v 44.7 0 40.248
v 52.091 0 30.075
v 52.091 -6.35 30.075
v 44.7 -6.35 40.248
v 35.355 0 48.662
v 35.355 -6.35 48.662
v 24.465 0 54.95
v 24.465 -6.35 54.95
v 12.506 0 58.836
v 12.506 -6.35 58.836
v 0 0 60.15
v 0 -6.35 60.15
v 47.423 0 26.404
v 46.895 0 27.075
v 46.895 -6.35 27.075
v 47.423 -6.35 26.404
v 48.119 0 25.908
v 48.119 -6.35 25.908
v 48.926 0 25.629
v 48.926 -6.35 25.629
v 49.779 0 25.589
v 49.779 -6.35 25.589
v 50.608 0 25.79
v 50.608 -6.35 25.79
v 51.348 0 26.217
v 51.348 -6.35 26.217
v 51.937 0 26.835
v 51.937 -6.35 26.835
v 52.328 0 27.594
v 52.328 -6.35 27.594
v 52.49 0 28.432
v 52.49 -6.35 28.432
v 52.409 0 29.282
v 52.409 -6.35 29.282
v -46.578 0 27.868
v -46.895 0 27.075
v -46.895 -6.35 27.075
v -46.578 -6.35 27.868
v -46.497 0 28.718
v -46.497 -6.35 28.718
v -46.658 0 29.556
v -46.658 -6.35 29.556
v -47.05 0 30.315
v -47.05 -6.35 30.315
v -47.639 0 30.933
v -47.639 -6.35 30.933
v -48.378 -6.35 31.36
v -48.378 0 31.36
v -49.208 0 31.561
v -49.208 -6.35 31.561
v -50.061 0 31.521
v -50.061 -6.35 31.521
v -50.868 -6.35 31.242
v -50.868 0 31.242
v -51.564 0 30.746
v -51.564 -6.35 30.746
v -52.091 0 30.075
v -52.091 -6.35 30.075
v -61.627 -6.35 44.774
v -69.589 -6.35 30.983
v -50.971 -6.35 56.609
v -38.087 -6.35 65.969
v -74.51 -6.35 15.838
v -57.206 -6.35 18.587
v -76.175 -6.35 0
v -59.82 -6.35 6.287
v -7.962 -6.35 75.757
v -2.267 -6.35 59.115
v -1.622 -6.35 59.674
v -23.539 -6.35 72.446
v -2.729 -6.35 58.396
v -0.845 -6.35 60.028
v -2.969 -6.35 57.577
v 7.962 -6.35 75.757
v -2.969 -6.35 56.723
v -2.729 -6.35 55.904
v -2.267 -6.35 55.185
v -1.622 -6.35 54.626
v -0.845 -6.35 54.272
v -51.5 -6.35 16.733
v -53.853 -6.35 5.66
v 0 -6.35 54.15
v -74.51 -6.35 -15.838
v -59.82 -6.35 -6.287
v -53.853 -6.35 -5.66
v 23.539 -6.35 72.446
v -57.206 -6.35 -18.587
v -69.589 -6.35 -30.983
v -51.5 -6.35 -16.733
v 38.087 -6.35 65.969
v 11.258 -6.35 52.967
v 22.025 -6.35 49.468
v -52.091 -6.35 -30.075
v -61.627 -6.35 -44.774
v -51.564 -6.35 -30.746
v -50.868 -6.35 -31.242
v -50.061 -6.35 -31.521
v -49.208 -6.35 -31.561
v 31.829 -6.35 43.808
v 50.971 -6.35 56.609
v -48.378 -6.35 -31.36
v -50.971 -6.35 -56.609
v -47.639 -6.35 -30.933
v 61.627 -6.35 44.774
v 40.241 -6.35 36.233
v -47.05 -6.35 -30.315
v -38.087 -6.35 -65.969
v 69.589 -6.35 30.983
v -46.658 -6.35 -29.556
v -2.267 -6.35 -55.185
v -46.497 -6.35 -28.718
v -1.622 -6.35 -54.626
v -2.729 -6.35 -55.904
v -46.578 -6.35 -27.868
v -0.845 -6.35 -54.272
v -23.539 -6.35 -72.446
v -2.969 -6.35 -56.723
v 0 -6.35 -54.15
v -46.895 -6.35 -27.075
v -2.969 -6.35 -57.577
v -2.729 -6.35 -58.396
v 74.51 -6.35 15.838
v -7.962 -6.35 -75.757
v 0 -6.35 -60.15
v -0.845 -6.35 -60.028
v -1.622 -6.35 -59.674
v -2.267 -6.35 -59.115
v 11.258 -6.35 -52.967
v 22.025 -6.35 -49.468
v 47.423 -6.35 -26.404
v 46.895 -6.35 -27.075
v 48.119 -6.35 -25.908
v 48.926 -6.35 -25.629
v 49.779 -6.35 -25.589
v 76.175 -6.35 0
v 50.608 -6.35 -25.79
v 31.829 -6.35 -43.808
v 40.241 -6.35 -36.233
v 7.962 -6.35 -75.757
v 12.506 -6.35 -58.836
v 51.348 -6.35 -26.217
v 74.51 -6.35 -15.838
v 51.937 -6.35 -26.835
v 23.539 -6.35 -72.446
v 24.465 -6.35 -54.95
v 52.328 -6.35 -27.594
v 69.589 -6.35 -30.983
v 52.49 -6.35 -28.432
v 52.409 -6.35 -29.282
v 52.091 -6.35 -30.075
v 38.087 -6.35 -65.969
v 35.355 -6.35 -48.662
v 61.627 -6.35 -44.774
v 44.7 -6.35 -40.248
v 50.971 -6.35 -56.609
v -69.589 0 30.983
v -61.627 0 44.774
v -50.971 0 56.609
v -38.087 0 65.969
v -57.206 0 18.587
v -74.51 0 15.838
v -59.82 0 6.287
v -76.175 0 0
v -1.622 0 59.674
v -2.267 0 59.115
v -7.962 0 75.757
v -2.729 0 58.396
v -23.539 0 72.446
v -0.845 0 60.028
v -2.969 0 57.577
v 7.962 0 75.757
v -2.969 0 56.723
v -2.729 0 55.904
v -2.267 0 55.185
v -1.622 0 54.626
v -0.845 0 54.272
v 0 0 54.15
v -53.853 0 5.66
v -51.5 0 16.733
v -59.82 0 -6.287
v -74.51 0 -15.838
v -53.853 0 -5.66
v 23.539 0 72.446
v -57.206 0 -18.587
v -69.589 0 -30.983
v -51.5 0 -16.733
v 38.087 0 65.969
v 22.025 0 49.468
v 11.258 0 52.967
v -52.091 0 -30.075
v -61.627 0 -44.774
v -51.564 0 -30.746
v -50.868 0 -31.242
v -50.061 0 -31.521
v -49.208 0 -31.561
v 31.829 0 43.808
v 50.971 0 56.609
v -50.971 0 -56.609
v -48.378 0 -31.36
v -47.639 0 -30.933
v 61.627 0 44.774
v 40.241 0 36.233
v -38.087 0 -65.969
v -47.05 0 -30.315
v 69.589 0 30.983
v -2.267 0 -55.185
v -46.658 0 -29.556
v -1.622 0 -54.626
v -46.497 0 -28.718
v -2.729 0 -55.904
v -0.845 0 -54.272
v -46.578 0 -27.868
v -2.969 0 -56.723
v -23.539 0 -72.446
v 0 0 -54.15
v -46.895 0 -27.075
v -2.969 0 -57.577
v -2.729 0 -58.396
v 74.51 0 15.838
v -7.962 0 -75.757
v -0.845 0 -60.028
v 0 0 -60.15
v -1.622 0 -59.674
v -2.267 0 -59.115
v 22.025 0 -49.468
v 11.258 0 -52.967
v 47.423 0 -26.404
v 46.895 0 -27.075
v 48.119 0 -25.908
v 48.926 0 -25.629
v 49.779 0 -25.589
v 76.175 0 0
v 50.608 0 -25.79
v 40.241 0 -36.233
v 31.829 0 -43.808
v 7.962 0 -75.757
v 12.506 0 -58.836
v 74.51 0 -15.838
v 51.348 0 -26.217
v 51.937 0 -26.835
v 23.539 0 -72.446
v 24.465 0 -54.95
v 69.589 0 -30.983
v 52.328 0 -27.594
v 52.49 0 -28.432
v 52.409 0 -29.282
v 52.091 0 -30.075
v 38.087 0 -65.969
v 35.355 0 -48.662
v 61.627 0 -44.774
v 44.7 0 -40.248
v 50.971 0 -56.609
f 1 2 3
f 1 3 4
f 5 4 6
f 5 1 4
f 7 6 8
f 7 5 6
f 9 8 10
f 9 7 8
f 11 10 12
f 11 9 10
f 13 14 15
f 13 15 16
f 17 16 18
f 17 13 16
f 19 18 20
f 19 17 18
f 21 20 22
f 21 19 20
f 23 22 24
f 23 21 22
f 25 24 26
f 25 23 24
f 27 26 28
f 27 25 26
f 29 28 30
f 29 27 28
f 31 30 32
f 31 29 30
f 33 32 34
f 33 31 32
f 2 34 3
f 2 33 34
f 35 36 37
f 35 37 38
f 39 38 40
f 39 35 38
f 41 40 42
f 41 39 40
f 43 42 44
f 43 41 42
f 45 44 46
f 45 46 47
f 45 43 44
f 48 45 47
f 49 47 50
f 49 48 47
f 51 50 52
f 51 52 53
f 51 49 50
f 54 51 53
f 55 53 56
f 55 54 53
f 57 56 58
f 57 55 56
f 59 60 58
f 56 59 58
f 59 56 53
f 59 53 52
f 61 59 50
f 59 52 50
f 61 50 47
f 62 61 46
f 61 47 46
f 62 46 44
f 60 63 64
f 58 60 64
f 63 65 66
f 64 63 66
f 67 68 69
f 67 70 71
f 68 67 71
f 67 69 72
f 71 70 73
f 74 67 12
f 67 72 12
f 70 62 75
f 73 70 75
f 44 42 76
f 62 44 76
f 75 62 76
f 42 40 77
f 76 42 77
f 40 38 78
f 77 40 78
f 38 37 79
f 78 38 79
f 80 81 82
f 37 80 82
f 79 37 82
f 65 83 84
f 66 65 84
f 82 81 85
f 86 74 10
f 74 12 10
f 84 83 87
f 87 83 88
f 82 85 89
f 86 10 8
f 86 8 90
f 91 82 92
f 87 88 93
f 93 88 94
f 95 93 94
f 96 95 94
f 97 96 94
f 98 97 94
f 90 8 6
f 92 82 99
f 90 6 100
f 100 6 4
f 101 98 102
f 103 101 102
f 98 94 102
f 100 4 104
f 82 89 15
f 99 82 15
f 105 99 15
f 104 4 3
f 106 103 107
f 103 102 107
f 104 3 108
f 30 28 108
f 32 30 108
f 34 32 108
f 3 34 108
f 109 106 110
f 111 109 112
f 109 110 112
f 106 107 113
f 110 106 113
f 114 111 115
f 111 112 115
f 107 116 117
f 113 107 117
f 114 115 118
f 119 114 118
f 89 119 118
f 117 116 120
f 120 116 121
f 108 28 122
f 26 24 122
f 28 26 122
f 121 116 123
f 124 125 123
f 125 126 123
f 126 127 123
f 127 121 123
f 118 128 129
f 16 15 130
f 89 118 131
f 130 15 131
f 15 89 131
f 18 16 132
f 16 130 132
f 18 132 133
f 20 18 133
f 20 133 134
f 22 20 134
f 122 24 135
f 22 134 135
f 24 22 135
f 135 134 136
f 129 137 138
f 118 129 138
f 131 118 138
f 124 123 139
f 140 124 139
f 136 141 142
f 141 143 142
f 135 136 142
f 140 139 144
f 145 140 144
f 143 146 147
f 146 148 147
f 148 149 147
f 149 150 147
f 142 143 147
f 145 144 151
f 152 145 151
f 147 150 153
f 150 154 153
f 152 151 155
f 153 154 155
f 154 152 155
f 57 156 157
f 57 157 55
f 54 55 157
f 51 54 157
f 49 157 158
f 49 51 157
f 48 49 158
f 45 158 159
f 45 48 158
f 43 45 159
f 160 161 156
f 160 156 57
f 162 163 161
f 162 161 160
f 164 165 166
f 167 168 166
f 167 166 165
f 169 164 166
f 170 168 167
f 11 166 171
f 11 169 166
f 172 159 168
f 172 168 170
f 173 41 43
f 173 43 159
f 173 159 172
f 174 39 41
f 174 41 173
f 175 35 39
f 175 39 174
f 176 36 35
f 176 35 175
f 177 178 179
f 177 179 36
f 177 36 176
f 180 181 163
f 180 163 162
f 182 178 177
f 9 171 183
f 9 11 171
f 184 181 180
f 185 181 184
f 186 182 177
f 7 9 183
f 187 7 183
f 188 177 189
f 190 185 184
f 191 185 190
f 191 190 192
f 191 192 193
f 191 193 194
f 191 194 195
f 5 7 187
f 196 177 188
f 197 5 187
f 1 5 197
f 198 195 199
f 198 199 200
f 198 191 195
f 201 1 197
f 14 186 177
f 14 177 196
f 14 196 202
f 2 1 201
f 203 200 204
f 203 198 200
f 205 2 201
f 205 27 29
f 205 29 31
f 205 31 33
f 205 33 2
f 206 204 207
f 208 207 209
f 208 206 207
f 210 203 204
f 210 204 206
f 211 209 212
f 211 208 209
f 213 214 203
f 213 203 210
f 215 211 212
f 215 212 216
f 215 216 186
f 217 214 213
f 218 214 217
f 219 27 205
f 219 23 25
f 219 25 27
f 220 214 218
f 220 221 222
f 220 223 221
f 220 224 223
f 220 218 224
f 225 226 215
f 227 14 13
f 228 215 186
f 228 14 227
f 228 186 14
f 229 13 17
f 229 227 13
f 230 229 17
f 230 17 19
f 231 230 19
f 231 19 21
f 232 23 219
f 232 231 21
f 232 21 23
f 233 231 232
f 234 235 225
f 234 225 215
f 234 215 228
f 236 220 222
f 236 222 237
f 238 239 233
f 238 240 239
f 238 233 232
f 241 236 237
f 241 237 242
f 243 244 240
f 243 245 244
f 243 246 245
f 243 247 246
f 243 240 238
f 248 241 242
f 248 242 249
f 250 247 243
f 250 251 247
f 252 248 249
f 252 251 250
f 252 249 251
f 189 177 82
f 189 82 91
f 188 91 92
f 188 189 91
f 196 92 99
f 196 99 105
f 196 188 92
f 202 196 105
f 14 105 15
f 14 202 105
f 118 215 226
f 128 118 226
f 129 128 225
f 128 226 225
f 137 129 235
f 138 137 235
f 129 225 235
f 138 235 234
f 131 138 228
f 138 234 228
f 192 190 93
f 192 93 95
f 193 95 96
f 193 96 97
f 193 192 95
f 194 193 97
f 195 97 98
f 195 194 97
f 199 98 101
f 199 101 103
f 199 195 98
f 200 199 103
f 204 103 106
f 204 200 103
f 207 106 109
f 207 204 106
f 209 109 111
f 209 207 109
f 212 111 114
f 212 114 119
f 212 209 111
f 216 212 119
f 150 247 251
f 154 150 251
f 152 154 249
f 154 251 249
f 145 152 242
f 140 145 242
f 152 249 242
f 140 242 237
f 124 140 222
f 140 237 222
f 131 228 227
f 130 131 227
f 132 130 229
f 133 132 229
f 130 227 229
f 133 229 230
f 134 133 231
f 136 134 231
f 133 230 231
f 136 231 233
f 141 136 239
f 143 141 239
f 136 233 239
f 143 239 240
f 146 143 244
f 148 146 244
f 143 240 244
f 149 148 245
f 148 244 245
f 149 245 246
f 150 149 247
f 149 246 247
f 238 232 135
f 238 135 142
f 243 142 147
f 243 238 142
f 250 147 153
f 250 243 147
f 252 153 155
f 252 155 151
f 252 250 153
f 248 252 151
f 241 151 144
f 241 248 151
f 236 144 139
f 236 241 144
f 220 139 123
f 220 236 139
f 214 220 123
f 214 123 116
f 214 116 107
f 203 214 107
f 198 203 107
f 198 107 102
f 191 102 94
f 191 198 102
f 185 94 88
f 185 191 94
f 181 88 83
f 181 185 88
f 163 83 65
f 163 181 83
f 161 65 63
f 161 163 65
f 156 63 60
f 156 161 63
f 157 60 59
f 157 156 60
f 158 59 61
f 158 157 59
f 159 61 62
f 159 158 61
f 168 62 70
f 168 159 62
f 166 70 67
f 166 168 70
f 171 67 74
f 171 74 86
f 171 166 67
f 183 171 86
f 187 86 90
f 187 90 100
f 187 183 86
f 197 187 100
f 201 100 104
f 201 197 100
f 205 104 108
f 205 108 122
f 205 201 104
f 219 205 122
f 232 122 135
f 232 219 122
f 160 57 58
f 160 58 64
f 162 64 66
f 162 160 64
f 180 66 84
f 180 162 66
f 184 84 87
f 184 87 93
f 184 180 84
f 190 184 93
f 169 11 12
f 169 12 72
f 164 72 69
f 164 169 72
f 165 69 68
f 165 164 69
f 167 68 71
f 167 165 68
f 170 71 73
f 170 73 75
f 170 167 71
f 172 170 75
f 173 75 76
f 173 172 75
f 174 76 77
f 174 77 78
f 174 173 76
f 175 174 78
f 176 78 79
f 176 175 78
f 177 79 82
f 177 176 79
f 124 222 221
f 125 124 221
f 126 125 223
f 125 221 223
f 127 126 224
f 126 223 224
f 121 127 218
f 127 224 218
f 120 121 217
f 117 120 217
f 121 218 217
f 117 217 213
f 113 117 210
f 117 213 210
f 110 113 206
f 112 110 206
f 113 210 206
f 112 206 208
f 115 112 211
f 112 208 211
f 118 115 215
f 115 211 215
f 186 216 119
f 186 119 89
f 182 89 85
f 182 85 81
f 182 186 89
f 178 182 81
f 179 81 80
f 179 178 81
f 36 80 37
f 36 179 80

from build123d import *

# Parameters (mm, degrees)
SKETCH2_R           = 76.1746
BOSS_EXTRUDE1_DEPTH = 6.35


with BuildPart() as part:
    # Sketch2 → Boss-Extrude1 (new body)
    with BuildSketch(Plane(origin=(0, 0, 0), x_dir=(1, 0, 0), z_dir=(0, 1, 0))):
        Circle(SKETCH2_R)
        with BuildLine():
            ThreePointArc((52.091428011, 30.074999984), (30.074999985, 52.091428011), (0, 60.149999969))
            ThreePointArc((0, 60.149999969), (-2.999999969, 57.15), (0, 54.150000031))
            ThreePointArc((0, 54.150000031), (27.075000016, 46.895275642), (46.895275642, 27.075000015))
            ThreePointArc((46.895275642, 27.075000015), (50.993351811, 25.976923815), (52.091428011, 30.074999984))
        make_face(mode=Mode.SUBTRACT)
        with BuildLine():
            ThreePointArc((0, -54.150000031), (27.075000016, -46.895275642), (46.895275642, -27.075000015))
            ThreePointArc((46.895275642, -27.075000015), (50.993351811, -25.976923815), (52.091428011, -30.074999985))
            ThreePointArc((52.091428011, -30.074999985), (30.074999984, -52.091428011), (0, -60.149999969))
            ThreePointArc((0, -60.149999969), (-2.999999969, -57.15), (0, -54.150000031))
        make_face(mode=Mode.SUBTRACT)
        with BuildLine():
            ThreePointArc((-46.895275642, 27.075000015), (-54.150000031, 0), (-46.895275642, -27.075000016))
            ThreePointArc((-46.895275642, -27.075000016), (-47.993351842, -31.173076185), (-52.091428011, -30.074999985))
            ThreePointArc((-52.091428011, -30.074999985), (-60.149999969, 0), (-52.091428011, 30.074999984))
            ThreePointArc((-52.091428011, 30.074999984), (-47.993351842, 31.173076185), (-46.895275642, 27.075000015))
        make_face(mode=Mode.SUBTRACT)
    extrude(amount=-BOSS_EXTRUDE1_DEPTH)


solid = part.part
